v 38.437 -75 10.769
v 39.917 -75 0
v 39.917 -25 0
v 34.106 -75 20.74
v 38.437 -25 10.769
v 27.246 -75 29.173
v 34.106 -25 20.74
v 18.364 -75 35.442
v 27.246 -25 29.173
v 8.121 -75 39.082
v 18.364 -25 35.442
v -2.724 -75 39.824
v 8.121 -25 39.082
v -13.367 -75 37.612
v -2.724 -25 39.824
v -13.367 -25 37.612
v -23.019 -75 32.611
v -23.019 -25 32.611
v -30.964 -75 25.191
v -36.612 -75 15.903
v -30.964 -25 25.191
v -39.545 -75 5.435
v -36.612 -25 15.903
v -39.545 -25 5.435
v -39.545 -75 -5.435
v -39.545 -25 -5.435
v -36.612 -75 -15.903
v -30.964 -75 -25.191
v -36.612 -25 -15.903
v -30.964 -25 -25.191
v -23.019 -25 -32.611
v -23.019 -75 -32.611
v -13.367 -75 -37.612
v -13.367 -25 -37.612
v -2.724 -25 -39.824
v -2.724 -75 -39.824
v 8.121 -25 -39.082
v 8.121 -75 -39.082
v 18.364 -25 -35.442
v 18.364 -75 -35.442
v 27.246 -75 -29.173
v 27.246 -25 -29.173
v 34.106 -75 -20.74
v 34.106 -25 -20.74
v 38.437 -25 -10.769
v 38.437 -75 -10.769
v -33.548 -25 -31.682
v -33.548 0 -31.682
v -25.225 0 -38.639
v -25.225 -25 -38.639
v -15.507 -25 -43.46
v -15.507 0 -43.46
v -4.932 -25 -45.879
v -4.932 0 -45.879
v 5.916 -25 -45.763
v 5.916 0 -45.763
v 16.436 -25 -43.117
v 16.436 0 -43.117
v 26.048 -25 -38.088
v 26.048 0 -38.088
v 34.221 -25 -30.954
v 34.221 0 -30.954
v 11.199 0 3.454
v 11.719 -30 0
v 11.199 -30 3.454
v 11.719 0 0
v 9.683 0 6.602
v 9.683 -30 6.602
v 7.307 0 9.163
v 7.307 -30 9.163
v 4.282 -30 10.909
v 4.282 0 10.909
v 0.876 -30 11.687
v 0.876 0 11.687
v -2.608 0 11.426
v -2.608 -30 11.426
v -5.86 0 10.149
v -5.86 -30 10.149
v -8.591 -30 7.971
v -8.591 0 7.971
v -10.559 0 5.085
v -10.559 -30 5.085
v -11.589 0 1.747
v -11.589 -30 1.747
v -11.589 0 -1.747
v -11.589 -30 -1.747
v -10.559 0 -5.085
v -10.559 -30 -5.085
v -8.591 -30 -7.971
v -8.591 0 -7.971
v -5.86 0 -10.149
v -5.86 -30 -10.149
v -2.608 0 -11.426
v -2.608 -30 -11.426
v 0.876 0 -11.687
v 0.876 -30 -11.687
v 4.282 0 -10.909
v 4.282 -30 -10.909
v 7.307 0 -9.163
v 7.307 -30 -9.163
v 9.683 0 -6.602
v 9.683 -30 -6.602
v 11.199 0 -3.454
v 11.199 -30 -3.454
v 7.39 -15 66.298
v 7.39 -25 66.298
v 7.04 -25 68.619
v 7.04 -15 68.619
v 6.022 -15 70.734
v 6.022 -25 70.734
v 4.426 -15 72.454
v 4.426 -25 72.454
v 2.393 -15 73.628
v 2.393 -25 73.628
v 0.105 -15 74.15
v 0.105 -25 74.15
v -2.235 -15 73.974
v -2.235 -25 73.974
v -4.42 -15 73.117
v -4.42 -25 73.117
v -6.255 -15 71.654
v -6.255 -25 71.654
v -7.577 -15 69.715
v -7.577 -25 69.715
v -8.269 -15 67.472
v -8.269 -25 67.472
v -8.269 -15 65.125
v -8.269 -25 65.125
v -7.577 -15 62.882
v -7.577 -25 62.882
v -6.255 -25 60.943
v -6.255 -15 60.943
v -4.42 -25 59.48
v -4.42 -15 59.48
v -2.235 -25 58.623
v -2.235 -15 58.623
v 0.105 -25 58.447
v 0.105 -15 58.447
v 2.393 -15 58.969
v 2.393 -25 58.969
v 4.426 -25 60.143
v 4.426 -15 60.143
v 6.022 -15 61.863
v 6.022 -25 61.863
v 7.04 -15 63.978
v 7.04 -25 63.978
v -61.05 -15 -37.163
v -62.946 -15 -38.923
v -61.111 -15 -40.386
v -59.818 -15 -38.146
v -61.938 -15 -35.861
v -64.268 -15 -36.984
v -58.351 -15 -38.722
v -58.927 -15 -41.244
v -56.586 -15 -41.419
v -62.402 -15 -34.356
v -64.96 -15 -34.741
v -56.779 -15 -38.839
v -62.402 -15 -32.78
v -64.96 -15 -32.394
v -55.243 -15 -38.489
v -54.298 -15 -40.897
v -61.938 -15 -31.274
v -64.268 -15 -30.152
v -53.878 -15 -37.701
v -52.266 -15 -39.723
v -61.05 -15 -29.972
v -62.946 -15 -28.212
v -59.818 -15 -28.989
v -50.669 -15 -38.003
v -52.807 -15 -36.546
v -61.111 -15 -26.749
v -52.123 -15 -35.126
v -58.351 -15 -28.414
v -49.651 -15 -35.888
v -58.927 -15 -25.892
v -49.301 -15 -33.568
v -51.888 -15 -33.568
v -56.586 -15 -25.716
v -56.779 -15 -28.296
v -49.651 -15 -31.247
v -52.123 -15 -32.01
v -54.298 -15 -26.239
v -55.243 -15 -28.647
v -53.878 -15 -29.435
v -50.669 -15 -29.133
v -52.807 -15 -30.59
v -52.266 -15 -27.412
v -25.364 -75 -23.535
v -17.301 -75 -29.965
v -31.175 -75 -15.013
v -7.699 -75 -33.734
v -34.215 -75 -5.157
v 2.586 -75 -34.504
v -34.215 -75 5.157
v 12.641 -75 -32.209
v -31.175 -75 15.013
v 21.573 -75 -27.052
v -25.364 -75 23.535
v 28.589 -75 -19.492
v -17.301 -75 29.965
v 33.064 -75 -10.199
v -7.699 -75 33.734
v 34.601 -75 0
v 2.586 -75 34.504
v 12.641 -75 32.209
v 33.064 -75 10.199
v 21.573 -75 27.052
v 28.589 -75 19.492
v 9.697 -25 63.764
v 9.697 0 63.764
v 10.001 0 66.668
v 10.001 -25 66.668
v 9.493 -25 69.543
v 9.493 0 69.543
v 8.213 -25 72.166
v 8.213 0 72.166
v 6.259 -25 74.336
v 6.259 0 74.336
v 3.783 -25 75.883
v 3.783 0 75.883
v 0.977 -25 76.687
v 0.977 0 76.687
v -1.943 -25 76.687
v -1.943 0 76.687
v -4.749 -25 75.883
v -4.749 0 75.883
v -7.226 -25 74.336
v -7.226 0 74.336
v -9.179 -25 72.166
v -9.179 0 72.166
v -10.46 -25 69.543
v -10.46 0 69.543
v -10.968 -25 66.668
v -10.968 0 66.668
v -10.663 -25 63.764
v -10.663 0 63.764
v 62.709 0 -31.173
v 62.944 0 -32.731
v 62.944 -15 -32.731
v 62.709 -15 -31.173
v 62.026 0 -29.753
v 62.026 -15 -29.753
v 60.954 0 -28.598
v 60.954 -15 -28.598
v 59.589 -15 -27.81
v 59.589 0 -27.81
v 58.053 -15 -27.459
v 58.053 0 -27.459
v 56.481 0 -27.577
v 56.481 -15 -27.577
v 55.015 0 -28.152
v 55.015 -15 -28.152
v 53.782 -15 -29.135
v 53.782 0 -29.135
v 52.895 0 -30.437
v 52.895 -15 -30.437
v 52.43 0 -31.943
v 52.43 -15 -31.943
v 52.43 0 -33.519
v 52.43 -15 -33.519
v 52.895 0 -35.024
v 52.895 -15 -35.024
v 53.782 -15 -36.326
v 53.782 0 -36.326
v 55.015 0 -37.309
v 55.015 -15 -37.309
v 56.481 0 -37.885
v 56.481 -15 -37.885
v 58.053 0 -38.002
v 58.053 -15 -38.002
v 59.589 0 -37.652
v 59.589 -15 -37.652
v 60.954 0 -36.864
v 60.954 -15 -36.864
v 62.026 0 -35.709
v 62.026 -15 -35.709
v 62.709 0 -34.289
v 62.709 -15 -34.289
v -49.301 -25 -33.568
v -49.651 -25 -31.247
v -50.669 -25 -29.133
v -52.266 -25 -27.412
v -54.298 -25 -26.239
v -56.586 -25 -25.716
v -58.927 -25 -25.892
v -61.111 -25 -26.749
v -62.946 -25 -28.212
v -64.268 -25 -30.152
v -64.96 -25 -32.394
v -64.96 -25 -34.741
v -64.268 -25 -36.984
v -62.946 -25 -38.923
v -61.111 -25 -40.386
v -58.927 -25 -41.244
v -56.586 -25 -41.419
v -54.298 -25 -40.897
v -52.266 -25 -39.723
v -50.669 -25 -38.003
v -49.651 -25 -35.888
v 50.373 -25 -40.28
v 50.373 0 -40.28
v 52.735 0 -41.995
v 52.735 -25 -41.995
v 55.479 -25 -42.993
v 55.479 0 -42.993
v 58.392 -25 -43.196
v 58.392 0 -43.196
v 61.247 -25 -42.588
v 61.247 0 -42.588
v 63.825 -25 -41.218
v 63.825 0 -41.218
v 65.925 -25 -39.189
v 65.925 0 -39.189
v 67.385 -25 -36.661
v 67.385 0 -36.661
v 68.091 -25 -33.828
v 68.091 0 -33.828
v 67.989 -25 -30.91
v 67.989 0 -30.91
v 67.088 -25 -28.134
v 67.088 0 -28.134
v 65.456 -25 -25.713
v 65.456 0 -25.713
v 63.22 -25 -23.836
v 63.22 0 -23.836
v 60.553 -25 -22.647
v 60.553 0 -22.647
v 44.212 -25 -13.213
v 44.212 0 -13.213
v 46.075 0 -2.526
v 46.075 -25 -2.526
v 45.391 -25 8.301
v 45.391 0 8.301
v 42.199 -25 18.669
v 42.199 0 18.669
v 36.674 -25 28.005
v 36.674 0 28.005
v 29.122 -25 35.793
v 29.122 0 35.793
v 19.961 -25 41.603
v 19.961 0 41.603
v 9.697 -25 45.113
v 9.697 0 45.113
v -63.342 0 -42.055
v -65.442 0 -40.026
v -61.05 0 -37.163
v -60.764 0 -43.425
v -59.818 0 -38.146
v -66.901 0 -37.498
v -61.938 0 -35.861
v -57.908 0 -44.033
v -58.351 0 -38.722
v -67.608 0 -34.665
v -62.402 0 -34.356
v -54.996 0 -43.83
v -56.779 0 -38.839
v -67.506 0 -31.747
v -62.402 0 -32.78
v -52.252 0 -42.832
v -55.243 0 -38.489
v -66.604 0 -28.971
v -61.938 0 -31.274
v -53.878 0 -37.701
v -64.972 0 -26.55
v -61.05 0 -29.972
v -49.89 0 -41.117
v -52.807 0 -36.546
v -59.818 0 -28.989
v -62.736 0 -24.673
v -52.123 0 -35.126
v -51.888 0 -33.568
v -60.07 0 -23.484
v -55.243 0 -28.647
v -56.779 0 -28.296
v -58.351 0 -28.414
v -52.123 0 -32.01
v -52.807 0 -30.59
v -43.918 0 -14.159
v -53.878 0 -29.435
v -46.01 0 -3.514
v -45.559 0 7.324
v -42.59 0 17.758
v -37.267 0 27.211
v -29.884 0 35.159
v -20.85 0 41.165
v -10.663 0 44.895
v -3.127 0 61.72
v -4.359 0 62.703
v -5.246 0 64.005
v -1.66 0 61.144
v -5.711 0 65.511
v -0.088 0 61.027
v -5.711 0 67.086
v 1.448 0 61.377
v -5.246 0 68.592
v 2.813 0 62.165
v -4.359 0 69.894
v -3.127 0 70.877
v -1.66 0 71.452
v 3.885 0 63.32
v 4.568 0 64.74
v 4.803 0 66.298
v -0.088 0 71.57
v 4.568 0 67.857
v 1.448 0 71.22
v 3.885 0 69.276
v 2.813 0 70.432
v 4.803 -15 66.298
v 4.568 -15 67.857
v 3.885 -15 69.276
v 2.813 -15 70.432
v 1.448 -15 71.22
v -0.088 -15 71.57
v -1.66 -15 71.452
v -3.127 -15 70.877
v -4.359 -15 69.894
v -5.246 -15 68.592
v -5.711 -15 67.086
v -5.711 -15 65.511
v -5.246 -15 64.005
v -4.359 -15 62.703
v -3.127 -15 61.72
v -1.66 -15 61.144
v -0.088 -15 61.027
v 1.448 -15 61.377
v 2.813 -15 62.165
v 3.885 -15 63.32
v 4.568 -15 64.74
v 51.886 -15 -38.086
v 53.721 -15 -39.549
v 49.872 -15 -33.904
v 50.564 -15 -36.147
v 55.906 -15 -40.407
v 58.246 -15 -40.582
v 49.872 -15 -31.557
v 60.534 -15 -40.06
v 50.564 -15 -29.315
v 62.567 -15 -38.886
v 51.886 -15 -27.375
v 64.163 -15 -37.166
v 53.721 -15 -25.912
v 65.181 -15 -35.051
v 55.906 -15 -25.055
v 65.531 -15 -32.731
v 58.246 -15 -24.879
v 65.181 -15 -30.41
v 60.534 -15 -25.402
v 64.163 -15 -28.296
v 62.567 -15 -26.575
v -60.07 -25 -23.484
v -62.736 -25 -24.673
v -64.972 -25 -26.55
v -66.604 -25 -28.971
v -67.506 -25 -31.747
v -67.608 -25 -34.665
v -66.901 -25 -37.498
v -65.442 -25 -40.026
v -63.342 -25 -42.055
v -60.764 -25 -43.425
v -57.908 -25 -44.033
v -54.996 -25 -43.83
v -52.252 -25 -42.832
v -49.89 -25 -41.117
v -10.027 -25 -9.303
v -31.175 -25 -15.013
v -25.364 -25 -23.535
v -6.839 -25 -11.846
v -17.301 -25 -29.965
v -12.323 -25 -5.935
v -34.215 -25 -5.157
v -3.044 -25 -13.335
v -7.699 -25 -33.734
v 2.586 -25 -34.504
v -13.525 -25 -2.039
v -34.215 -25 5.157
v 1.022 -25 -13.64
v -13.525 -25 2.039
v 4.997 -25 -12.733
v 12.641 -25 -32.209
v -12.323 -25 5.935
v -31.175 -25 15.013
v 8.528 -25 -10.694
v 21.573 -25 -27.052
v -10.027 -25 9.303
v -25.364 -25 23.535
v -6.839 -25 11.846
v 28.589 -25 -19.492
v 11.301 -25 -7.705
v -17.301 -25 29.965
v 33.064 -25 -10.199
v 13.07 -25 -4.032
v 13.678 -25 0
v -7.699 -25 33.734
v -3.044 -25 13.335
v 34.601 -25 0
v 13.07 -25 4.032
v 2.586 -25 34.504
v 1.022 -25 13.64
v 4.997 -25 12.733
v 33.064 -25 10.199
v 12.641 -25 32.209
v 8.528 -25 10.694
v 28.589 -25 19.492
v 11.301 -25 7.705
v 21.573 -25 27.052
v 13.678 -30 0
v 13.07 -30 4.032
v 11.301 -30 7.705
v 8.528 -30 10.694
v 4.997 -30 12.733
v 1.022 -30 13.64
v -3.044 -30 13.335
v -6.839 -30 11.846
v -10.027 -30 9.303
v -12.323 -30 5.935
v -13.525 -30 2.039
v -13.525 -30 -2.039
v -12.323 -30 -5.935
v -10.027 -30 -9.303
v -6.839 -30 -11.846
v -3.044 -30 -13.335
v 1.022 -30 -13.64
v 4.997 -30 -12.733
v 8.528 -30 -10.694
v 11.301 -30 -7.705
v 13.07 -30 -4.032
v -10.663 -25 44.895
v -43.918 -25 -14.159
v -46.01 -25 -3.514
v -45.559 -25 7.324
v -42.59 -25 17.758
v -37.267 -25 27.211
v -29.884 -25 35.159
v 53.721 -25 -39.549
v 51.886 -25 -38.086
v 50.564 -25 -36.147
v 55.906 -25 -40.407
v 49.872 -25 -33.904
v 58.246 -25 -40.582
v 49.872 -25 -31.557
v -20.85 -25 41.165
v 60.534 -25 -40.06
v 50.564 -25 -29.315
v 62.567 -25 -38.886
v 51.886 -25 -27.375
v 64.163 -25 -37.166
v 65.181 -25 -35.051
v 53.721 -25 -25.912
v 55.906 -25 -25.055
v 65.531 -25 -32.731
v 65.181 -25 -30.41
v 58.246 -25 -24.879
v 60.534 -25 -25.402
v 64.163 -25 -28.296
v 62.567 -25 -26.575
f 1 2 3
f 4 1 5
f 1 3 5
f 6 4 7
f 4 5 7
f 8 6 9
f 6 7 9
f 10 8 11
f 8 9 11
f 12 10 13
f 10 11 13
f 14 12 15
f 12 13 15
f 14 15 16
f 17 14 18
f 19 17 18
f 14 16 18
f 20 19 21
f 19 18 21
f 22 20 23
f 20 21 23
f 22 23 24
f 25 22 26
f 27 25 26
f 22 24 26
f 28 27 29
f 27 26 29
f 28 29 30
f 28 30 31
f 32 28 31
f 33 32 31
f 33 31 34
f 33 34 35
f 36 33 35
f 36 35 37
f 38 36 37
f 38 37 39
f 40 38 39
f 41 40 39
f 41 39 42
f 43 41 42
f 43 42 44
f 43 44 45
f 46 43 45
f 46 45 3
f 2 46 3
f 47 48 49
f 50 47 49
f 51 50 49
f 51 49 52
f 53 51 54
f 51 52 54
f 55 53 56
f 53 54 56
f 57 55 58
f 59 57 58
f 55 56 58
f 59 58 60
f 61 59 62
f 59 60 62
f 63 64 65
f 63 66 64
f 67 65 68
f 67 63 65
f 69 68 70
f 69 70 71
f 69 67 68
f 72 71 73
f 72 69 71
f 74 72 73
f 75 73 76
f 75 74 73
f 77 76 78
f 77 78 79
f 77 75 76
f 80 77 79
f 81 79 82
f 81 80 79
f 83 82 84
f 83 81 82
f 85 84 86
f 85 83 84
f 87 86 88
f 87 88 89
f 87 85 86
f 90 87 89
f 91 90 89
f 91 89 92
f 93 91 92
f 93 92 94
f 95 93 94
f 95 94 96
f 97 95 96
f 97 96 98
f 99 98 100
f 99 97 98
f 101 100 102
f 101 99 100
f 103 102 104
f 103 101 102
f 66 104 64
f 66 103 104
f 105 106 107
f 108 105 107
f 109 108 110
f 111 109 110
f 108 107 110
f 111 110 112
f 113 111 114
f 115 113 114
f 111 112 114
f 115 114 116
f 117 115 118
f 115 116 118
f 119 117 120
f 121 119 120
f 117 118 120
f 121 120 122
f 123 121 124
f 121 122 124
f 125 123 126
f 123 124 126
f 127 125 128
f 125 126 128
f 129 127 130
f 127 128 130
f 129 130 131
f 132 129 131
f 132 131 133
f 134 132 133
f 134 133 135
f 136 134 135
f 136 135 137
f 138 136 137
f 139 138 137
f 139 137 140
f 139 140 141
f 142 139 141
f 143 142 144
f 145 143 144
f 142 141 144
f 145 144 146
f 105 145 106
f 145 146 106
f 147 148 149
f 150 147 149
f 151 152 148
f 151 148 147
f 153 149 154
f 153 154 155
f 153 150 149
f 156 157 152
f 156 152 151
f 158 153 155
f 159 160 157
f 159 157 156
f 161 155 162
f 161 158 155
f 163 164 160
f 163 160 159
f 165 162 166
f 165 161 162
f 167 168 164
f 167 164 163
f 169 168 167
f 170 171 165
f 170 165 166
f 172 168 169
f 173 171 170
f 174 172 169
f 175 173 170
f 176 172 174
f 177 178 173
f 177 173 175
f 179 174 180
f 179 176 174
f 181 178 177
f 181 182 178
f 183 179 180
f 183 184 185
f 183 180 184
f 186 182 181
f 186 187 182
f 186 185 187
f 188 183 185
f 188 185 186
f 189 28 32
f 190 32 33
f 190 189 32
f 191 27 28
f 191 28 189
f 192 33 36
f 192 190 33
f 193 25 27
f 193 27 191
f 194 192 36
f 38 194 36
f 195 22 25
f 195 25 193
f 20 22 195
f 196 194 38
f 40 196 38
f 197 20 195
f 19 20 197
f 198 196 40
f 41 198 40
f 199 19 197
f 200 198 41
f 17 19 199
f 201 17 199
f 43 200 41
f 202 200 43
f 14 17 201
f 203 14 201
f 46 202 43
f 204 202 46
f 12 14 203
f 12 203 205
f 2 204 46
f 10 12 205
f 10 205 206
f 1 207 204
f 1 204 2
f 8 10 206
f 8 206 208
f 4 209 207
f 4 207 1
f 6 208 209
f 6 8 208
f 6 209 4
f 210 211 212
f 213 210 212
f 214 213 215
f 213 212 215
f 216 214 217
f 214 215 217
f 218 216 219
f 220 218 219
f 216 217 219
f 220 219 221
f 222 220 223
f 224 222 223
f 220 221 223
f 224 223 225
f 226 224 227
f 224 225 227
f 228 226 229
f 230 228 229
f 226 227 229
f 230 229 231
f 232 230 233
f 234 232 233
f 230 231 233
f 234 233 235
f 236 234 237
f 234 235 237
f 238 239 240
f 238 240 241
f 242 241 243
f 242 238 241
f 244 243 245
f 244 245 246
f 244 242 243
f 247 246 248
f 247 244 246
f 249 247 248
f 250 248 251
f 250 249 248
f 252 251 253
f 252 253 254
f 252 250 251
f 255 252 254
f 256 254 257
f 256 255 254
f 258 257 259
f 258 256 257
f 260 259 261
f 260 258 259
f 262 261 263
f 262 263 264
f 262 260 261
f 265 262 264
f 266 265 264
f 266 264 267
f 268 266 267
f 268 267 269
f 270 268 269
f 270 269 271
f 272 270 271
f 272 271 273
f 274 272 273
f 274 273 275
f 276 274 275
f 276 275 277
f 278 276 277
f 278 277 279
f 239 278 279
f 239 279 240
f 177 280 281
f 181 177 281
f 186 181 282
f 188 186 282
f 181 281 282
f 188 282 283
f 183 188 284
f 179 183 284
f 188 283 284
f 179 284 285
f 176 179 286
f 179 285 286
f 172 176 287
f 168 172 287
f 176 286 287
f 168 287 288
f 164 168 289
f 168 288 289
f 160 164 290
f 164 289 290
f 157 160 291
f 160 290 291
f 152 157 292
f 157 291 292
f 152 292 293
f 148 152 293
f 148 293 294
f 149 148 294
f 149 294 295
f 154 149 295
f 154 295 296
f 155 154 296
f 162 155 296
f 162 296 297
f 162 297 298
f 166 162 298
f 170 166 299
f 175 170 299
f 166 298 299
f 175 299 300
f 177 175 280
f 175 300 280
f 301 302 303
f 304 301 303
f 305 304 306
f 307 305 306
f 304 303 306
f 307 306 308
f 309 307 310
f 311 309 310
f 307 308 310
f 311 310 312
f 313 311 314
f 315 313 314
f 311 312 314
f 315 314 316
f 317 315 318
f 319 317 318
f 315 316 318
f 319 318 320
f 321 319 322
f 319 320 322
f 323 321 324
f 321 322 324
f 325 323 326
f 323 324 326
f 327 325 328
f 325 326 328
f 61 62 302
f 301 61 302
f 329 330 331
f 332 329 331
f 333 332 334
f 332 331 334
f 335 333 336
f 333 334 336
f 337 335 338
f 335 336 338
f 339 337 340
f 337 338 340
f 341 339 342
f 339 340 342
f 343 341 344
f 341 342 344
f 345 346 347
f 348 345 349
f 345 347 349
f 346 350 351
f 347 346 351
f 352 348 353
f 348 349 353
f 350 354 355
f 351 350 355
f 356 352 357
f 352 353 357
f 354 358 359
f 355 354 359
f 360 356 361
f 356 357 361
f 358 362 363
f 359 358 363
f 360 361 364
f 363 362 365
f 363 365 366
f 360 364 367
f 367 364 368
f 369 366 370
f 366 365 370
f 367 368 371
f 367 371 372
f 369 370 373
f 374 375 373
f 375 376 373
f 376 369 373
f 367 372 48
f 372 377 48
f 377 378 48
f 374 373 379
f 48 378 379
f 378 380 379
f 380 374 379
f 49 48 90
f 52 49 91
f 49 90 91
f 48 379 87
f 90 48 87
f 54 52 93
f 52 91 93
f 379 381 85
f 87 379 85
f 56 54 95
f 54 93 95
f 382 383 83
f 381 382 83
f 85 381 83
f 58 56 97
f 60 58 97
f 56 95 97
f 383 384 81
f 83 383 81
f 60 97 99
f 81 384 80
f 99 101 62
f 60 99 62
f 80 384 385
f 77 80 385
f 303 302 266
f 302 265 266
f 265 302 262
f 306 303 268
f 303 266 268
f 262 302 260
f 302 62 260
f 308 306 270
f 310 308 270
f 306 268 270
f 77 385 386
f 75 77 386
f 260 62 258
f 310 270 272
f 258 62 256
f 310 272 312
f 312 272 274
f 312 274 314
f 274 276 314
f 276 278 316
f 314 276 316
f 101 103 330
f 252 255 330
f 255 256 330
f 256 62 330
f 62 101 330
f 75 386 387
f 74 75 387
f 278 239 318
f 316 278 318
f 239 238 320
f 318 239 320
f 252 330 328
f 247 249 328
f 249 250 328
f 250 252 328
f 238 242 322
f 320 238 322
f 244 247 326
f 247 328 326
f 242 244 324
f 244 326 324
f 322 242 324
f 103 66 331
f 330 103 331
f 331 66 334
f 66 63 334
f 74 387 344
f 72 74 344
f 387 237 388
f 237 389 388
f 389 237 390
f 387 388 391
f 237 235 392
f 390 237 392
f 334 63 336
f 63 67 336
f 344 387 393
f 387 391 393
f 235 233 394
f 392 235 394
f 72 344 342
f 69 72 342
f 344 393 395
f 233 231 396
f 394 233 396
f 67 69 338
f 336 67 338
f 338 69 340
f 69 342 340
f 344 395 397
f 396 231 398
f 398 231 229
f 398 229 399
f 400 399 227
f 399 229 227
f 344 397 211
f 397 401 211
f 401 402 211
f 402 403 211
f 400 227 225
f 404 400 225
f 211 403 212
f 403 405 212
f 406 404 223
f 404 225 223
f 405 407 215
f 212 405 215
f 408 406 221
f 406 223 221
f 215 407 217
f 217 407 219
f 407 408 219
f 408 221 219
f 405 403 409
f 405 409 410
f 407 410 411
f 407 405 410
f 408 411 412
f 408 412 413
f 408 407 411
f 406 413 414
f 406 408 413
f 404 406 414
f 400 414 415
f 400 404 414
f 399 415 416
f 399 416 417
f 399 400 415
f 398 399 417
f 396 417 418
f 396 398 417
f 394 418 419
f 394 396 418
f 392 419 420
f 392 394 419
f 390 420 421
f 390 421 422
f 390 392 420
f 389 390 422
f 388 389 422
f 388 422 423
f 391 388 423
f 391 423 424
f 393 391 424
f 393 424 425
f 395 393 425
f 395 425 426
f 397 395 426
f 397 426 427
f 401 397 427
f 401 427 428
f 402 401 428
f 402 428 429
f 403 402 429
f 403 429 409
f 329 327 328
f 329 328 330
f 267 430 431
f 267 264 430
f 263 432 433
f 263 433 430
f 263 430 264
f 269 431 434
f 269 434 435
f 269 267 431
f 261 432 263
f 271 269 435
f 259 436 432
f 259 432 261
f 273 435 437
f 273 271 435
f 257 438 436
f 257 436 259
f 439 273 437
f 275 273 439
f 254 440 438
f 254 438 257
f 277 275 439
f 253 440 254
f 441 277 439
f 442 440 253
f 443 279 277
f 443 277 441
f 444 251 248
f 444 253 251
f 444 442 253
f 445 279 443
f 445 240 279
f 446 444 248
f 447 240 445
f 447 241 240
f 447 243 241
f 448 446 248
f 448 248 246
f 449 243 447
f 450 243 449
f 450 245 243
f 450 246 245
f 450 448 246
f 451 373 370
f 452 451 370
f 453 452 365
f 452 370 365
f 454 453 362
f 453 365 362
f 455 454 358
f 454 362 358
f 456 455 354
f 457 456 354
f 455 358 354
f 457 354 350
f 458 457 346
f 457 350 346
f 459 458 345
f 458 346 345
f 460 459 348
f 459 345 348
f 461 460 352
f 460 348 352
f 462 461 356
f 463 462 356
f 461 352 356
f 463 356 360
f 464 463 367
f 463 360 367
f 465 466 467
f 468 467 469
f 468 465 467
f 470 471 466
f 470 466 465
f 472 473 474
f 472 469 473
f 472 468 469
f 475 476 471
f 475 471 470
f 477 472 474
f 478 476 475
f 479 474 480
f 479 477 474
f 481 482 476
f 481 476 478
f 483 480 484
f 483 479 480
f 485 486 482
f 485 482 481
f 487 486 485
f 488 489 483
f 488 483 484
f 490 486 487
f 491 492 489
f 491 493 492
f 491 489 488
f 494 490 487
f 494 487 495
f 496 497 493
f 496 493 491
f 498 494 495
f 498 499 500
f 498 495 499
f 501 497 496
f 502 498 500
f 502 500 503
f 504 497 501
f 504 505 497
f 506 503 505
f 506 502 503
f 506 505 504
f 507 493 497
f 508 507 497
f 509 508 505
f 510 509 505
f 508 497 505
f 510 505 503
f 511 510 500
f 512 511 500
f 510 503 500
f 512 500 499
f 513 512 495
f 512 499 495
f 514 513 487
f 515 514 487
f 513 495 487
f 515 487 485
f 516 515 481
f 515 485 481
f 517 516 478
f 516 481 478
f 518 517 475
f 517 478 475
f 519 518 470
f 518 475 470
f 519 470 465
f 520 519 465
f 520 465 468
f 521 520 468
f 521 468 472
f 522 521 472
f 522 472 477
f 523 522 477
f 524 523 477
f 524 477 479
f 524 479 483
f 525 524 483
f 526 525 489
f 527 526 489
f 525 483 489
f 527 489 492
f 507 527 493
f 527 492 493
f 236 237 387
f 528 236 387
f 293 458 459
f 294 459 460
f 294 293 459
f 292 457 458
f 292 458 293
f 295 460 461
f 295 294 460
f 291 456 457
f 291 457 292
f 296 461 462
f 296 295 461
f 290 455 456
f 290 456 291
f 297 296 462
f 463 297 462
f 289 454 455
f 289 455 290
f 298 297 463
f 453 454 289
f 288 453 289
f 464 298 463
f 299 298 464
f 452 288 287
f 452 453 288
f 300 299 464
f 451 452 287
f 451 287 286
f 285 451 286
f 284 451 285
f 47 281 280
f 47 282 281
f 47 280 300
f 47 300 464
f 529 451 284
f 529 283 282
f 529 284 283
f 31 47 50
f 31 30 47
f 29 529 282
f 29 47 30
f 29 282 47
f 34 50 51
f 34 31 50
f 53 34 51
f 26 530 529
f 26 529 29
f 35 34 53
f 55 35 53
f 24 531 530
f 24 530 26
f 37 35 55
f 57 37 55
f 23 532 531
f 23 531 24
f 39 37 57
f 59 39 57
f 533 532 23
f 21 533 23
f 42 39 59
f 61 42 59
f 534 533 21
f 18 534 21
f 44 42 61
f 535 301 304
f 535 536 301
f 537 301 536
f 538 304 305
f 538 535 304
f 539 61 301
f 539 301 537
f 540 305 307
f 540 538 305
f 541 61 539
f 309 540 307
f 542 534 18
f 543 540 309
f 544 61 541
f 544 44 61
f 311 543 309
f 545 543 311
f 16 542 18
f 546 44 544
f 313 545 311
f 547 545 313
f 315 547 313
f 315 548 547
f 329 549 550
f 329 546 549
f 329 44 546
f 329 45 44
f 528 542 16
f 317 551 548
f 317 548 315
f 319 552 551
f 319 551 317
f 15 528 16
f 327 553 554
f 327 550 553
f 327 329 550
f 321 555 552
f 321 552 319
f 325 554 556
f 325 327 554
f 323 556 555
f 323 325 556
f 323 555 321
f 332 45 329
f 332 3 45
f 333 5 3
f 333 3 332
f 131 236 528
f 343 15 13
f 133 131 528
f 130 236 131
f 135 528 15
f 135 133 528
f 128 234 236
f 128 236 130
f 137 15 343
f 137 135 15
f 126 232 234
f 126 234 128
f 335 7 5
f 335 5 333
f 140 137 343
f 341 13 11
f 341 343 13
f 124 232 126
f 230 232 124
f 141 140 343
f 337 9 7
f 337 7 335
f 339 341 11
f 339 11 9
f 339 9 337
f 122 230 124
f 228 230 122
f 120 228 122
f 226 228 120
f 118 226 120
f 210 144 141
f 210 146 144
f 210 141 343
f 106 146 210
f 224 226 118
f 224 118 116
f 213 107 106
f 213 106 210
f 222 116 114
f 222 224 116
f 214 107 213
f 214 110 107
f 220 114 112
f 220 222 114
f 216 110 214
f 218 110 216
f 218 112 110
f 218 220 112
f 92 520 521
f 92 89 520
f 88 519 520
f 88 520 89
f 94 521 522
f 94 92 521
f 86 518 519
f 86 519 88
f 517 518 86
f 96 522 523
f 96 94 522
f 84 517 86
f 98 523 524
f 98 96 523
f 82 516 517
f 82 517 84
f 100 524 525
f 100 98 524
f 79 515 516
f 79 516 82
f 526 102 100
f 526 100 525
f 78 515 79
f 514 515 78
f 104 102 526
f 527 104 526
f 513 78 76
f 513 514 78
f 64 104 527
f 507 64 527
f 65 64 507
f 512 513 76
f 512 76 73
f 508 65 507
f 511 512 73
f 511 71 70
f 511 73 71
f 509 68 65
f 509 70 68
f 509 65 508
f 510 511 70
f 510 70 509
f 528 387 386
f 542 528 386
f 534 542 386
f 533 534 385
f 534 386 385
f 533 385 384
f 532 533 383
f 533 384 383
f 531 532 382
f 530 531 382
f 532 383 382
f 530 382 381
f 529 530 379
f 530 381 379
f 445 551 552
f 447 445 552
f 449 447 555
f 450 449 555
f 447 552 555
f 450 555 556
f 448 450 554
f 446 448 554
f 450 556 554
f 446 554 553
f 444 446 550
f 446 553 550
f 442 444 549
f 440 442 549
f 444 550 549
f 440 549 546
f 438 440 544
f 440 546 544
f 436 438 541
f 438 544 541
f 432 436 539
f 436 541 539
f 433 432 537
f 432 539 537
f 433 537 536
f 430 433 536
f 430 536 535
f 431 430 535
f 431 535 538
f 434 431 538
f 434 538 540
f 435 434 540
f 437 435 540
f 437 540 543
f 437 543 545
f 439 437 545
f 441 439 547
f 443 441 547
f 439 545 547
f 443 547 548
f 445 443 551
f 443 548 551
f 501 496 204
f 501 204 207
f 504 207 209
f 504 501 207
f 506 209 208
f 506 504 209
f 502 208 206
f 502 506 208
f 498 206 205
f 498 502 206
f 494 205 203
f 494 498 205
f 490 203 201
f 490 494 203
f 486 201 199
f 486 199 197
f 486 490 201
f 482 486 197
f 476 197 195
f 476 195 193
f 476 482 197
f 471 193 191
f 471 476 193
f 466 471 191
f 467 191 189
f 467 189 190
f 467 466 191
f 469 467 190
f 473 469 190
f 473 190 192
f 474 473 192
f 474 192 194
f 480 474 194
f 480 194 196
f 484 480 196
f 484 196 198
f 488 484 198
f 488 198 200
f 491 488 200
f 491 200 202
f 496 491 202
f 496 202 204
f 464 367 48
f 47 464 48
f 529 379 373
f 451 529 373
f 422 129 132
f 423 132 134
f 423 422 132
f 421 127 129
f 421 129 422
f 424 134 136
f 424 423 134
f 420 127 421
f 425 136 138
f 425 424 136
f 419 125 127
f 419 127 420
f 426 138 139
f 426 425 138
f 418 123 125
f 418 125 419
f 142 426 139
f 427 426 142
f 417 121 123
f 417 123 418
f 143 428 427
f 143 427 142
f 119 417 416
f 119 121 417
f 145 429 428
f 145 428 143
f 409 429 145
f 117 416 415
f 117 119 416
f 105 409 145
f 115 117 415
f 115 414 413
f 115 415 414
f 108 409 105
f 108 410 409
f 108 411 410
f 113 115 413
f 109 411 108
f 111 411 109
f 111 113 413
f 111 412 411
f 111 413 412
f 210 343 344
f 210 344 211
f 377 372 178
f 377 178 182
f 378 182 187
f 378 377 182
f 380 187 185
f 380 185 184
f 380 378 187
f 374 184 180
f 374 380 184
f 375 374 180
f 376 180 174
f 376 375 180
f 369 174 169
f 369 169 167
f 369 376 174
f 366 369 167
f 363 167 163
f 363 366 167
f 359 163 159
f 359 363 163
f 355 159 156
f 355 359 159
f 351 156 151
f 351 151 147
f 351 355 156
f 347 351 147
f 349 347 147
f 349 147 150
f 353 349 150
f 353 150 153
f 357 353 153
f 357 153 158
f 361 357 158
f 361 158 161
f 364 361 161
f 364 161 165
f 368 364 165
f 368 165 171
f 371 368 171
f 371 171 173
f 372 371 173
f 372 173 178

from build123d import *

# Parameters (mm, degrees)
F0_R     = 5.2865279156
F1_DEPTH = 25
F2_R     = 39.9170706603
F2_R_2   = 34.6011659379
F3_DEPTH = 75
F4_R     = 11.7194622097
F5_DEPTH = 25
F6_R     = 7.873360038
F6_R_2   = 5.2865279156
F7_DEPTH = 10
F8_R     = 13.6780275644
F8_R_2   = 11.7194622097
F9_DEPTH = 5


with BuildPart() as f1:
    # F0 (on Front) → F1 (new body)
    with BuildSketch(Plane.XZ):
        with BuildLine():
            Line((-10.6633168949, 63.7640005702), (-10.6633168949, 44.8946944847))
            ThreePointArc((-10.6633168949, 44.8946944847), (-40.2070284925, 22.6414394393), (-43.917693949, -14.1589575281))
            Line((-43.917693949, -14.1589575281), (-60.0696593727, -23.4842991134))
            ThreePointArc((-60.0696593727, -23.4842991134), (-66.2598598239, -38.8131493377), (-49.8895858933, -41.1167036046))
            Line((-49.8895858933, -41.1167036046), (-33.5482874715, -31.6820505619))
            ThreePointArc((-33.5482874715, -31.6820505619), (0.4954525136, -46.1410278048), (34.2208638849, -30.9543598714))
            Line((34.2208638849, -30.9543598714), (50.3728293087, -40.2797014568))
            ThreePointArc((50.3728293087, -40.2797014568), (66.7431032393, -37.9761471898), (60.5529027881, -22.6472969656))
            Line((60.5529027881, -22.6472969656), (44.2116043663, -13.2126439228))
            ThreePointArc((44.2116043663, -13.2126439228), (39.7115759789, 23.4995883656), (9.6968300641, 45.1133173995))
            Line((9.6968300641, 45.1133173995), (9.6968300641, 63.7640005702))
            ThreePointArc((9.6968300641, 63.7640005702), (-0.4832434154, 76.7892965276), (-10.6633168949, 63.7640005702))
        make_face()
        with Locations((-57.1745378733, -33.5677362638)):
            Circle(F0_R, mode=Mode.SUBTRACT)
        with Locations((57.6577812887, -32.730734116)):
            Circle(F0_R, mode=Mode.SUBTRACT)
        with Locations((-0.4832434154, 66.2984703798)):
            Circle(F0_R, mode=Mode.SUBTRACT)
    extrude(amount=F1_DEPTH)

    # F2 (on Front) → F3 (join)
    with BuildSketch(Plane.XZ):
        Circle(F2_R)
        Circle(F2_R_2, mode=Mode.SUBTRACT)
    extrude(amount=F3_DEPTH)

    # F4 (on Front) → F5 (cut)
    with BuildSketch(Plane.XZ):
        Circle(F4_R)
    extrude(amount=F5_DEPTH, mode=Mode.SUBTRACT)

    # F6 (on face) → F7 (cut)
    with BuildSketch(Plane.XZ.offset(25)):
        with Locations((-0.4832434154, 66.2984703798)):
            Circle(F6_R)
        with Locations((-0.4832434154, 66.2984703798)):
            Circle(F6_R_2, mode=Mode.SUBTRACT)
        with Locations((-57.1745378733, -33.5677362638)):
            Circle(F6_R)
        with Locations((-57.1745378733, -33.5677362638)):
            Circle(F6_R_2, mode=Mode.SUBTRACT)
        with Locations((57.6577812887, -32.730734116)):
            Circle(F6_R)
        with Locations((57.6577812887, -32.730734116)):
            Circle(F6_R_2, mode=Mode.SUBTRACT)
    extrude(amount=-F7_DEPTH, mode=Mode.SUBTRACT)

    # F8 (on face) → F9 (join)
    with BuildSketch(Plane.XZ.offset(25)):
        Circle(F8_R)
        Circle(F8_R_2, mode=Mode.SUBTRACT)
    extrude(amount=F9_DEPTH)


solid = f1.part
